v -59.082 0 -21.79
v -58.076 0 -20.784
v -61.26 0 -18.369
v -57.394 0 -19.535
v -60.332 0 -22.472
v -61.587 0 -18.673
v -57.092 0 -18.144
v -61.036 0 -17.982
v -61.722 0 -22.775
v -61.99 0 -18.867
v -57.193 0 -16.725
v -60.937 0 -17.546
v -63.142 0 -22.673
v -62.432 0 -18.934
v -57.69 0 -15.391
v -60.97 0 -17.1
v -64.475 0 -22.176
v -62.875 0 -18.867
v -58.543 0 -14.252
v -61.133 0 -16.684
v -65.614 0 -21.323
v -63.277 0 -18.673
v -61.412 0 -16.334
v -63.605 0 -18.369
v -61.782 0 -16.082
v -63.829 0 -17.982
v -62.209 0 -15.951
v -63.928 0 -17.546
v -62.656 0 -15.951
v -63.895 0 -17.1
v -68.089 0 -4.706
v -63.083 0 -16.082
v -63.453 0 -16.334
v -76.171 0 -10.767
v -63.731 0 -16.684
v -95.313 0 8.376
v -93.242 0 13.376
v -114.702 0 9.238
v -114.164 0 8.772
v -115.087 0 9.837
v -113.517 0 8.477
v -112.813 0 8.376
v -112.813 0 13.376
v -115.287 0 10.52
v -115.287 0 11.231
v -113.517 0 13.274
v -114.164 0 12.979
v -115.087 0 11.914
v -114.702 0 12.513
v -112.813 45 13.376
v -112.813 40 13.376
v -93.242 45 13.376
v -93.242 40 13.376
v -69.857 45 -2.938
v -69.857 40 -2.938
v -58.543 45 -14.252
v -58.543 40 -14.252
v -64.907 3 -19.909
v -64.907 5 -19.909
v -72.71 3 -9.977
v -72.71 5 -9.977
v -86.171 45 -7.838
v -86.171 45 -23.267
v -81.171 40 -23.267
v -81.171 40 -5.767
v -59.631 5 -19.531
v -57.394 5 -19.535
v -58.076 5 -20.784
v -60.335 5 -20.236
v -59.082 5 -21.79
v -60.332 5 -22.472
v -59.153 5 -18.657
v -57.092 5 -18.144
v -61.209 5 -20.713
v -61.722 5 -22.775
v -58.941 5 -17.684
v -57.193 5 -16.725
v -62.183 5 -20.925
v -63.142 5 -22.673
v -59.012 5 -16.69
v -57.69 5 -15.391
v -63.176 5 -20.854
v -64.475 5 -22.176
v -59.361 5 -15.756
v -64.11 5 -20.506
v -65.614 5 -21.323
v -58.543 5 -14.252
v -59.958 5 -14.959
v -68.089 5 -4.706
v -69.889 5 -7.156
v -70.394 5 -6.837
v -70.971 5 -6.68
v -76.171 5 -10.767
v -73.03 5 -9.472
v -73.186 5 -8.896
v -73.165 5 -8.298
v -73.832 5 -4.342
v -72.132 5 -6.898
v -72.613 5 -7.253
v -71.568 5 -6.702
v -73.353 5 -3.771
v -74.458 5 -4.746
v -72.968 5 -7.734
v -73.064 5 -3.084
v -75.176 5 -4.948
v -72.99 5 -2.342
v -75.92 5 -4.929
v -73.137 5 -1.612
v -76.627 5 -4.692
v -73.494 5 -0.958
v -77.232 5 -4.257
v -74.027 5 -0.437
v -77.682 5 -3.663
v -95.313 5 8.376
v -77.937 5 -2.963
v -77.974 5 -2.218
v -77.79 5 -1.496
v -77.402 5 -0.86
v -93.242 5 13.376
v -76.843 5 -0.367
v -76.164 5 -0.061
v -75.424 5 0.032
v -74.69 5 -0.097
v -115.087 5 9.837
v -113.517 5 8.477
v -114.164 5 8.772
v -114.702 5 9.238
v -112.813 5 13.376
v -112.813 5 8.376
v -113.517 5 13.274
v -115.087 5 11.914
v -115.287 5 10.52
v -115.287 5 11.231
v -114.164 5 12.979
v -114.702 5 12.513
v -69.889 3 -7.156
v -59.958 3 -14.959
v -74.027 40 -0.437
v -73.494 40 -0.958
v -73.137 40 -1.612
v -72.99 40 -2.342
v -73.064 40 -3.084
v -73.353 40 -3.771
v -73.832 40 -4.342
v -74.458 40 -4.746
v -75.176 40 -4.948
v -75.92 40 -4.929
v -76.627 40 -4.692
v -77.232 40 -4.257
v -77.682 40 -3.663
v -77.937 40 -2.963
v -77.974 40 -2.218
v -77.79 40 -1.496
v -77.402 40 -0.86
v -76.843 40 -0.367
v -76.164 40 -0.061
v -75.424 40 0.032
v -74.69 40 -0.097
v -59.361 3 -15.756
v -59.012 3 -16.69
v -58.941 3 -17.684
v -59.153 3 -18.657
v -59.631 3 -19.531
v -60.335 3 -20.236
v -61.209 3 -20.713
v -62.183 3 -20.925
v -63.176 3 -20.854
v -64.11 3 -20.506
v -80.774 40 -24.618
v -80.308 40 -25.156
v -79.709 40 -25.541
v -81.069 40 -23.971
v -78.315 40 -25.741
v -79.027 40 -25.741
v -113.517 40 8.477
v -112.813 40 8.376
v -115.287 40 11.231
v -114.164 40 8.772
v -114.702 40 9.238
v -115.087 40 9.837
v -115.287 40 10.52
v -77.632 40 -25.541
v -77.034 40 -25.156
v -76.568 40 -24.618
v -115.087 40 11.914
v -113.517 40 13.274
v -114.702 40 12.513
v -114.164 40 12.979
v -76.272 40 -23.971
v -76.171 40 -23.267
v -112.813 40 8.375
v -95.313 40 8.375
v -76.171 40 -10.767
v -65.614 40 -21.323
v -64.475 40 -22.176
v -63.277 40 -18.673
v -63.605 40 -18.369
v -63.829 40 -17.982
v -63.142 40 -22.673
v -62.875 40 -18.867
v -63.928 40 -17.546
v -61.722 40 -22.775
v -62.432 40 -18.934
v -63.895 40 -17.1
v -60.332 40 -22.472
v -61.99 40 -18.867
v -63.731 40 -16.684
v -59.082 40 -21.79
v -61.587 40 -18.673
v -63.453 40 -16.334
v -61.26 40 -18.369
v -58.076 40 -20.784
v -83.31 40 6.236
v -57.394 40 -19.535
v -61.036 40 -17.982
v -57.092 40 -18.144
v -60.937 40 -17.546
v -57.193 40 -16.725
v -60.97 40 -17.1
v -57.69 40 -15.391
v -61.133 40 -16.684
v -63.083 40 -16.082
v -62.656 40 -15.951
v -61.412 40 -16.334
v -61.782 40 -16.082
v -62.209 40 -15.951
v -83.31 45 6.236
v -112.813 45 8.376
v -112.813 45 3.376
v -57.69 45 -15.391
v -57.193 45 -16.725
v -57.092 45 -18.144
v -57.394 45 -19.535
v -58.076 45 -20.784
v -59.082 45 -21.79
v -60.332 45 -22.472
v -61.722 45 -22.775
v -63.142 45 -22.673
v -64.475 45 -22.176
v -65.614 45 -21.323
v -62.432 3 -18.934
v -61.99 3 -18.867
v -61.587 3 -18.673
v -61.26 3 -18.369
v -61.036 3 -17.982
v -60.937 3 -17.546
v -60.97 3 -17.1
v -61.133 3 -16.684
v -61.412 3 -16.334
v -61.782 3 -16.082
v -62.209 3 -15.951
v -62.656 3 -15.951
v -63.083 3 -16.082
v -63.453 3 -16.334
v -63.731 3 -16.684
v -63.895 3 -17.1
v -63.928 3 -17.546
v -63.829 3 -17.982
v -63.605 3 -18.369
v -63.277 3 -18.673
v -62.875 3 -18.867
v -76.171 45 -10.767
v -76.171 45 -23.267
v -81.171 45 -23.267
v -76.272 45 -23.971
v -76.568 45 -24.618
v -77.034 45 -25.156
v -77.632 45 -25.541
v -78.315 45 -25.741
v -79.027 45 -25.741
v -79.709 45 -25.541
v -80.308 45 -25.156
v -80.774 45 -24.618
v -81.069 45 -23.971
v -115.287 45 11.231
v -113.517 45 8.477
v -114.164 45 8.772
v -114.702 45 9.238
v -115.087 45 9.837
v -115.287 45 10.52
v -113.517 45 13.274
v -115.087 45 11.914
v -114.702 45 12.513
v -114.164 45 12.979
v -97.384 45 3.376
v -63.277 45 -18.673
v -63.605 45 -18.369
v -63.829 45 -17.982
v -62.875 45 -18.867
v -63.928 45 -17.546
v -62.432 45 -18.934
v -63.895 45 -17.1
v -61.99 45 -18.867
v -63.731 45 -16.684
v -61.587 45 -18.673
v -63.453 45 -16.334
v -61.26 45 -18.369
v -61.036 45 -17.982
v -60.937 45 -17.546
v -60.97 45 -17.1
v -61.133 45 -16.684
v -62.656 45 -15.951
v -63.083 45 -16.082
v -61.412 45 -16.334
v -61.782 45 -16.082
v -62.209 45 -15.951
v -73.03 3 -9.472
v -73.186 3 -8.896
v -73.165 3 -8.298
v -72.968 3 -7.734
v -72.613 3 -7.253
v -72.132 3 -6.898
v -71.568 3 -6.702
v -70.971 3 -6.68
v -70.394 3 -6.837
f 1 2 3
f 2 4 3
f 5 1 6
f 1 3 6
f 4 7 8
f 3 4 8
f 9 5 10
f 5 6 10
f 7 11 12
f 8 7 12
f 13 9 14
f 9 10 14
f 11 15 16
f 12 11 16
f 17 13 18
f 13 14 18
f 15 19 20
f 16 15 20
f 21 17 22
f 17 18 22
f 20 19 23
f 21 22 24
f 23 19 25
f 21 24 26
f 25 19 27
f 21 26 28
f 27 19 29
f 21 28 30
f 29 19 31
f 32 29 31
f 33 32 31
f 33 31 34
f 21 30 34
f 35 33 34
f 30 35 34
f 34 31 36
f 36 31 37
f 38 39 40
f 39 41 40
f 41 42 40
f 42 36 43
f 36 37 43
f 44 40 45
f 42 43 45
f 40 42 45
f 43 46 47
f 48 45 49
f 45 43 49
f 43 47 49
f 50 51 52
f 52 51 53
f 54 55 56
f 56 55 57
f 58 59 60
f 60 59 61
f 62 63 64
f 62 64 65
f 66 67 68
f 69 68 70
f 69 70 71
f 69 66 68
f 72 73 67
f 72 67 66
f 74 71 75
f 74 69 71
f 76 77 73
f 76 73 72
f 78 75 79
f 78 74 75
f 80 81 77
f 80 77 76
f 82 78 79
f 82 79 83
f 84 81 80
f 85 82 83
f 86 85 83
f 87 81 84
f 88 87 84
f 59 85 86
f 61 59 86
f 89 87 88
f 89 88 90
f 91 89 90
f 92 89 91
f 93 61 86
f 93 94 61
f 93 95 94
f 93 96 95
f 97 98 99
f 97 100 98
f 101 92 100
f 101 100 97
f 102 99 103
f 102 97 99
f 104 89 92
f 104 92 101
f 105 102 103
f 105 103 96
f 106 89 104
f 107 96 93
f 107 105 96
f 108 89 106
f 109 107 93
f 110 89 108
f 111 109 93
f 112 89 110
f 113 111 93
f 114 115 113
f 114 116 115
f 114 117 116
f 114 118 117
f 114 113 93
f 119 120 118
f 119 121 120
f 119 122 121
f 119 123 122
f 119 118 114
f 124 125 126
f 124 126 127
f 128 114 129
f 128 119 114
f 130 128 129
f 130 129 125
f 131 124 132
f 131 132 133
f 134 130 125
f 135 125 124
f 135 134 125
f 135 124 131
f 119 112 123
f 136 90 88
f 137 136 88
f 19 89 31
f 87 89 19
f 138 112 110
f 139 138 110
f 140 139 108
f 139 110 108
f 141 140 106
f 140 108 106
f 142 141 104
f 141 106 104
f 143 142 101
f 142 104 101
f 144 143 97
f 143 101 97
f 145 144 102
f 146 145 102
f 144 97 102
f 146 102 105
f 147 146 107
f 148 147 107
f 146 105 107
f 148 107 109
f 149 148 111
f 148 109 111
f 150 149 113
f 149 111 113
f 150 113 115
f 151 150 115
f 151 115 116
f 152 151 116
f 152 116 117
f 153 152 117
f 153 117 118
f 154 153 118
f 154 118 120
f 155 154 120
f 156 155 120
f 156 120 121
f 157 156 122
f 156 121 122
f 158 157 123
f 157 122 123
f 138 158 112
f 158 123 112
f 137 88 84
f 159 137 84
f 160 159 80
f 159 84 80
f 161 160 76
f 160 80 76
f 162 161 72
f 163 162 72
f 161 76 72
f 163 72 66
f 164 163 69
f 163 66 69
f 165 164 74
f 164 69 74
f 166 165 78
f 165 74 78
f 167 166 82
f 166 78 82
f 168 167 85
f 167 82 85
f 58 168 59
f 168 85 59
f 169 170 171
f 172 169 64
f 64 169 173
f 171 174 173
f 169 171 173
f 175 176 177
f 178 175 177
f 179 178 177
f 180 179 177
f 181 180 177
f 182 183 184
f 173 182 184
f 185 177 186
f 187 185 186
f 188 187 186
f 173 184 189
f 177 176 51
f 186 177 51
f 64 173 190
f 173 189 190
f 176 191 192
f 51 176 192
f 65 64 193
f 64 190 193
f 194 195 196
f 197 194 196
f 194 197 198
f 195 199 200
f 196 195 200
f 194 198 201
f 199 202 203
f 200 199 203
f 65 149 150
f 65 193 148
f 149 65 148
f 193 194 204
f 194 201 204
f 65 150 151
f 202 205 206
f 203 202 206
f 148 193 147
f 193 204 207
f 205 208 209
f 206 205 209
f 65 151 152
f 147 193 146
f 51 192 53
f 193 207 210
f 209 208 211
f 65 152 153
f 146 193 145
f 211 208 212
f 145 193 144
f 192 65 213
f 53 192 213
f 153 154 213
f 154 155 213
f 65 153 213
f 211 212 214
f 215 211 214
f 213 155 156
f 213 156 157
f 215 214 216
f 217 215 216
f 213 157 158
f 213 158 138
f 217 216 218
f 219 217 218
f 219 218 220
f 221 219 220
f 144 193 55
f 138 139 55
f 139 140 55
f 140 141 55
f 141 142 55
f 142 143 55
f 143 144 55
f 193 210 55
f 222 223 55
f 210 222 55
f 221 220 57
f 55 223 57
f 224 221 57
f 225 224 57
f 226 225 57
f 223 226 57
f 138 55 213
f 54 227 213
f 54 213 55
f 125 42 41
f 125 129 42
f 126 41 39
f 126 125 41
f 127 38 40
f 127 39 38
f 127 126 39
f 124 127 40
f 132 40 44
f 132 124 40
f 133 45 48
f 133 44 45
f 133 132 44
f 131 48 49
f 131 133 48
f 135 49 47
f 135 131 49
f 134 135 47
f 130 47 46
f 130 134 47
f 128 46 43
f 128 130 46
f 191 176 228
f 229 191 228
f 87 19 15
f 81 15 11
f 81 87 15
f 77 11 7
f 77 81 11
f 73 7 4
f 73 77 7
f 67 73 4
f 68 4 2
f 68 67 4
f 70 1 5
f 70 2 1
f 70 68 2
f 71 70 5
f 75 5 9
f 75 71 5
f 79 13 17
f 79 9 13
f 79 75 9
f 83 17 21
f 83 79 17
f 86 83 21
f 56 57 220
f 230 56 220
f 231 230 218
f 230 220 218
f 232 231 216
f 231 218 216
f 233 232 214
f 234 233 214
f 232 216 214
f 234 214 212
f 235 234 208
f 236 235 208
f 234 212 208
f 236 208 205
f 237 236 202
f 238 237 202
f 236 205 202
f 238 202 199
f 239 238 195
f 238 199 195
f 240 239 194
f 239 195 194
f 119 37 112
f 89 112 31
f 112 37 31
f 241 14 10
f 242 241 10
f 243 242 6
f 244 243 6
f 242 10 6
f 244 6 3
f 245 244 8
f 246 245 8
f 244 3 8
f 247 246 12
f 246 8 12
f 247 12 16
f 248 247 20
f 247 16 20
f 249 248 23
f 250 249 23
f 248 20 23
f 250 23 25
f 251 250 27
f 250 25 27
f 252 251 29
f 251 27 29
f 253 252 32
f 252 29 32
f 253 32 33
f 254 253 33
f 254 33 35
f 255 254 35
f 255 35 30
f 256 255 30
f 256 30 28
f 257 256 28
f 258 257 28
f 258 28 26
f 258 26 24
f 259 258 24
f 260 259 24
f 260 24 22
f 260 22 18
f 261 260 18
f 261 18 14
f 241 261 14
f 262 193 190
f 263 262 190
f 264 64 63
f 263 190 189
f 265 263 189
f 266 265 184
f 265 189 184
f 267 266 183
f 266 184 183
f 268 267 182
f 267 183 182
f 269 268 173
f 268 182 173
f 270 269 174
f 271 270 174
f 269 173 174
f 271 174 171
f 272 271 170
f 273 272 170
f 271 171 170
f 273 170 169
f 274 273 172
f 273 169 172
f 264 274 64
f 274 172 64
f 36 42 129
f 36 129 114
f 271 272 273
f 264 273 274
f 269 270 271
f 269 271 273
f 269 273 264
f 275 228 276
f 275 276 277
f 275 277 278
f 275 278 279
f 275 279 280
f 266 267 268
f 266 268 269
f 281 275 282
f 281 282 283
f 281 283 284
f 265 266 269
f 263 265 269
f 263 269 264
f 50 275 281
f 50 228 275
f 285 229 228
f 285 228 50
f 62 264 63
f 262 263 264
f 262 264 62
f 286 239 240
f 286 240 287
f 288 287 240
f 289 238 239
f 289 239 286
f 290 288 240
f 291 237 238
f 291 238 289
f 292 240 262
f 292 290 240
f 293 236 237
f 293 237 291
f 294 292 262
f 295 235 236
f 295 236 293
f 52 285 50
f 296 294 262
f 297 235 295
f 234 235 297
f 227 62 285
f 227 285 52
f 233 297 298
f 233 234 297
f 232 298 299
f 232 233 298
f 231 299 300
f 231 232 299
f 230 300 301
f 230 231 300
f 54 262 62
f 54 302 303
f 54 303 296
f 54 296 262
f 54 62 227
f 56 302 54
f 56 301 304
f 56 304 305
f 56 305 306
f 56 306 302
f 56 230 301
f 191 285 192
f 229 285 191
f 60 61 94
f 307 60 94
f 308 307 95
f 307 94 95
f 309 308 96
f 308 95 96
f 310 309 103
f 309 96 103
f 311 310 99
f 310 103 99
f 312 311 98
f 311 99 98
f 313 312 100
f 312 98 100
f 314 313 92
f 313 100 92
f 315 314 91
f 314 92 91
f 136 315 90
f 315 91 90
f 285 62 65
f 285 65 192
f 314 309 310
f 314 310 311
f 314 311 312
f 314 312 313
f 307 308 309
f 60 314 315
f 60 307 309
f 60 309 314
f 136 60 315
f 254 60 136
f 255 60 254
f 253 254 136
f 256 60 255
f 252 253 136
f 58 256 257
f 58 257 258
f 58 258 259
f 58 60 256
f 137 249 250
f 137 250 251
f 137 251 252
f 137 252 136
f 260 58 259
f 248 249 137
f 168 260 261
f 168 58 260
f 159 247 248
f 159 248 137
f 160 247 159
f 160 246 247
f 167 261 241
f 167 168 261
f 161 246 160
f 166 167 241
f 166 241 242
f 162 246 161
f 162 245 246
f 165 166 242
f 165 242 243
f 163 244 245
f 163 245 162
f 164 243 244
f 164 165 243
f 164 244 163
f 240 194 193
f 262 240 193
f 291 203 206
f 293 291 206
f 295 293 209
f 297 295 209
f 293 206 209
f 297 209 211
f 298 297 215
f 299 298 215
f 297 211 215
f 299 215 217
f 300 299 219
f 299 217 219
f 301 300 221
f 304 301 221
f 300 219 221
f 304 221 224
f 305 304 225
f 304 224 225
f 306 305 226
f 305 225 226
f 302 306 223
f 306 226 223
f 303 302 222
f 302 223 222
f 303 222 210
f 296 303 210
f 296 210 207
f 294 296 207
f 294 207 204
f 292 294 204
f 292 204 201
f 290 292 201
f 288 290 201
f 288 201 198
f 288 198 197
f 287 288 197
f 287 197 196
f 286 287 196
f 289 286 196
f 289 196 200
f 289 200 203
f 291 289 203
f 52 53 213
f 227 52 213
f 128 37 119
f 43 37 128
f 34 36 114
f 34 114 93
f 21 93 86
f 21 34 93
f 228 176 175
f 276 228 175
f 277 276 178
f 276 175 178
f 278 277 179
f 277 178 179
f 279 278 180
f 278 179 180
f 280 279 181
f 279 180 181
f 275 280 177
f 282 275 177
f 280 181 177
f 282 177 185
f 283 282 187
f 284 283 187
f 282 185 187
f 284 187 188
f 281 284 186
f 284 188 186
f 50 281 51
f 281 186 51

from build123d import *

# Parameters (mm, degrees)
AUFSATZ_LINEAR_AUSTRAGEN1_DEPTH  = 5
VERRUNDUNG1_RADIUS               = 2.5
VERRUNDUNG1_LENGTH               = 5
SKIZZE6_W                        = 37
SKIZZE6_H                        = 5
AUFSATZ_LINEAR_AUSTRAGEN3_DEPTH  = 5
SCHNITT_LINEAR_AUSTRAGEN3_DEPTH  = 5
AUFSATZ_LINEAR_AUSTRAGEN6_DEPTH  = 5
SCHNITT_LINEAR_AUSTRAGEN2_DEPTH  = 2
VERRUNDUNG8_RADIUS               = 2.5
VERRUNDUNG8_LENGTH               = 5
VERRUNDUNG9_RADIUS               = 5
VERRUNDUNG9_LENGTH               = 5
SKIZZE37_R                       = 2.5
AUFSATZ_LINEAR_AUSTRAGEN11_DEPTH = 35
SPIEGELN19_START                 = 40
SPIEGELN19_DEPTH                 = 5
SCHNITT_LINEAR_AUSTRAGEN4_DEPTH  = 5
SKIZZE39_W                       = 20
SKIZZE39_H                       = 5
AUFSATZ_LINEAR_AUSTRAGEN12_DEPTH = 5
SKIZZE40_W                       = 17.5
SKIZZE40_H                       = 5
AUFSATZ_LINEAR_AUSTRAGEN14_DEPTH = 5
SKIZZE41_W                       = 17.5
SKIZZE41_H                       = 5
AUFSATZ_LINEAR_AUSTRAGEN15_DEPTH = 5
FASE10_SIZE                      = 5
SKIZZE42_R                       = 1.5
SCHNITT_LINEAR_AUSTRAGEN6_DEPTH  = 127.435665063
SCHNITT_LINEAR_AUSTRAGEN7_DEPTH  = 5


# Read off the part's stored shape, not the designer's step: Spiegeln19
with BuildPart() as part:
    # Skizze2 → Aufsatz-Linear austragen1 (new body)
    with BuildSketch(Plane(origin=(0, 0, 0), x_dir=(1, 0, 0), z_dir=(0, 1, 0))):
        Polygon((-81.170751107, 25.766558824), (-76.170751107, 25.766558824), (-76.170751107, 3.695491012), (-93.241818919, -13.3755768), (-115.312886731, -13.3755768), (-115.312886731, -8.3755768), (-95.312886731, -8.3755768), (-81.170751107, 5.766558824), align=None)
    extrude(amount=AUFSATZ_LINEAR_AUSTRAGEN1_DEPTH)

    # Verrundung1: full round fillet: the end face becomes a half cylinder, R = half its width
    verrundung1_face = Plane((-115.312886731, 2.5, 10.8755768), x_dir=(0, 1, 0), z_dir=(-1, 0, 0))  # on the end face: x along it, z out of the body
    verrundung1_slab = verrundung1_face.offset(-VERRUNDUNG1_RADIUS / 2) * Box(VERRUNDUNG1_LENGTH, 2 * VERRUNDUNG1_RADIUS, VERRUNDUNG1_RADIUS, mode=Mode.PRIVATE)  # the body's end, R deep
    verrundung1_round = Plane((-112.812886731, 2.5, 10.8755768), x_dir=(-1, 0, 0), z_dir=(0, 1, 0)) * Cylinder(VERRUNDUNG1_RADIUS, VERRUNDUNG1_LENGTH, mode=Mode.PRIVATE)  # its axis R under the face
    add(verrundung1_slab - verrundung1_round, mode=Mode.SUBTRACT)

    # Skizze6 → Aufsatz-Linear austragen3 (add, symmetric)
    with BuildSketch(Plane(origin=(-39.933121059, 0, -39.933121059), x_dir=(0.7071067811865485, 0, -0.7071067811865467), z_dir=(0.7071067811865467, 0, 0.7071067811865485))):
        with Locations((-44.818815693, 2.5)):
            Rectangle(SKIZZE6_W, SKIZZE6_H)
    extrude(amount=AUFSATZ_LINEAR_AUSTRAGEN3_DEPTH, both=True)

    # Skizze10 → Schnitt-Linear austragen3 (cut)
    with BuildSketch(Plane.XZ):
        Polygon((-84.706285013, 4.840042894), (-68.089275655, -4.705898652), (-81.170751107, 8.3755768), align=None)
    extrude(amount=-SCHNITT_LINEAR_AUSTRAGEN3_DEPTH, mode=Mode.SUBTRACT)

    # Skizze15 → Aufsatz-Linear austragen6 (add)
    with BuildSketch(Plane.XZ):
        Polygon((-93.241818919, 13.3755768), (-68.089275655, -4.705898652), (-84.706285013, 4.840042894), align=None)
    extrude(amount=-AUFSATZ_LINEAR_AUSTRAGEN6_DEPTH)

    # Skizze9 → Schnitt-Linear austragen2 (cut)
    with BuildSketch(Plane(origin=(0, 5, 0), x_dir=(1, 0, 0), z_dir=(0, 1, 0))):
        with BuildLine():
            Line((-64.90729514, 19.908694448), (-72.710166677, 9.977325168))
            ThreePointArc((-72.710166677, 9.977325168), (-72.613070241, 7.253171877), (-69.888916951, 7.156075442))
            Line((-69.888916951, 7.156075442), (-59.957547671, 14.958946979))
            ThreePointArc((-59.957547671, 14.958946979), (-59.957547671, 19.908694448), (-64.90729514, 19.908694448))
        make_face()
    extrude(amount=-SCHNITT_LINEAR_AUSTRAGEN2_DEPTH, mode=Mode.SUBTRACT)

    # Verrundung8: full round fillet: the end face becomes a half cylinder, R = half its width
    verrundung8_face = Plane((-78.670751107, 2.5, -25.766558824), x_dir=(0, 1, 0), z_dir=(0, 0, -1))  # on the end face: x along it, z out of the body
    verrundung8_slab = verrundung8_face.offset(-VERRUNDUNG8_RADIUS / 2) * Box(VERRUNDUNG8_LENGTH, 2 * VERRUNDUNG8_RADIUS, VERRUNDUNG8_RADIUS, mode=Mode.PRIVATE)  # the body's end, R deep
    verrundung8_round = Plane((-78.670751107, 2.5, -23.266558824), x_dir=(0, 0, -1), z_dir=(0, 1, 0)) * Cylinder(VERRUNDUNG8_RADIUS, VERRUNDUNG8_LENGTH, mode=Mode.PRIVATE)  # its axis R under the face
    add(verrundung8_slab - verrundung8_round, mode=Mode.SUBTRACT)

    # Verrundung9: full round fillet: the end face becomes a half cylinder, R = half its width
    verrundung9_face = Plane((-58.543334109, 2.5, -21.32290801), x_dir=(0, 1, 0), z_dir=(0.707106781187, 0, -0.707106781187))  # on the end face: x along it, z out of the body
    verrundung9_slab = verrundung9_face.offset(-VERRUNDUNG9_RADIUS / 2) * Box(VERRUNDUNG9_LENGTH, 2 * VERRUNDUNG9_RADIUS, VERRUNDUNG9_RADIUS, mode=Mode.PRIVATE)  # the body's end, R deep
    verrundung9_round = Plane((-62.078868015, 2.5, -17.787374104), x_dir=(0.707106781187, 0, -0.707106781187), z_dir=(0, 1, 0)) * Cylinder(VERRUNDUNG9_RADIUS, VERRUNDUNG9_LENGTH, mode=Mode.PRIVATE)  # its axis R under the face
    add(verrundung9_slab - verrundung9_round, mode=Mode.SUBTRACT)

    # Skizze37 → Aufsatz-Linear austragen11 (add)
    with BuildSketch(Plane(origin=(0, 5, 0), x_dir=(1, 0, 0), z_dir=(0, 1, 0))):
        with Locations(Location((-75.486500657, 2.467174327, 0), (0, 0, 305.711324765))):
            Circle(SKIZZE37_R)
    extrude(amount=AUFSATZ_LINEAR_AUSTRAGEN11_DEPTH)

    # Spiegeln19 outline → Spiegeln19 (add)
    with BuildSketch(Plane(origin=(0, 0, 0), x_dir=(1, 0, 0), z_dir=(0, 1, 0)).offset(SPIEGELN19_START)):
        with BuildLine():
            ThreePointArc((-58.543334109, 14.251840198), (-58.543334109, 21.32290801), (-65.614401921, 21.32290801))
            Line((-65.614401921, 21.32290801), (-76.170751107, 10.766558824))
            Line((-76.170751107, 10.766558824), (-76.170751107, 23.266558824))
            ThreePointArc((-76.170751107, 23.266558824), (-78.670751107, 25.766558824), (-81.170751107, 23.266558824))
            Line((-81.170751107, 23.266558824), (-81.170751107, 5.766558824))
            Line((-81.170751107, 5.766558824), (-95.312886731, -8.3755768))
            Line((-95.312886731, -8.3755768), (-112.812886731, -8.3755768))
            ThreePointArc((-112.812886731, -8.3755768), (-115.312886731, -10.8755768), (-112.812886731, -13.3755768))
            Line((-112.812886731, -13.3755768), (-93.241818919, -13.3755768))
            Line((-93.241818919, -13.3755768), (-83.310270003, -6.236057904))
            Line((-83.310270003, -6.236057904), (-81.170751107, -8.3755768))
            Line((-81.170751107, -8.3755768), (-58.543334109, 14.251840198))
        make_face()
    extrude(amount=SPIEGELN19_DEPTH)

    # Skizze38 → Schnitt-Linear austragen4 (cut)
    with BuildSketch(Plane(origin=(0, 45, 0), x_dir=(1, 0, 0), z_dir=(0, 1, 0))):
        Polygon((-83.310270003, -6.236057904), (-69.857042608, 2.938131699), (-81.170751107, -8.3755768), align=None)
    extrude(amount=-SCHNITT_LINEAR_AUSTRAGEN4_DEPTH, mode=Mode.SUBTRACT)

    # Skizze39 → Aufsatz-Linear austragen12 (add)
    with BuildSketch(Plane(origin=(-43.468654965, 0, -43.468654965), x_dir=(-0.7071067811865486, 0, 0.7071067811865465), z_dir=(-0.7071067811865465, 0, -0.7071067811865486))):
        with Locations((63.318815693, 42.5)):
            Rectangle(SKIZZE39_W, SKIZZE39_H)
    extrude(amount=AUFSATZ_LINEAR_AUSTRAGEN12_DEPTH)

    # Skizze40 → Aufsatz-Linear austragen14 (add)
    with BuildSketch(Plane.ZY.offset(81.170751107)):
        with Locations((-14.516558824, 42.5)):
            Rectangle(SKIZZE40_W, SKIZZE40_H)
    extrude(amount=AUFSATZ_LINEAR_AUSTRAGEN14_DEPTH)

    # Skizze41 → Aufsatz-Linear austragen15 (add)
    with BuildSketch(Plane(origin=(0, 0, 8.3755768), x_dir=(-1, 0, 0), z_dir=(0, 0, -1))):
        with Locations((104.062886731, 42.5)):
            Rectangle(SKIZZE41_W, SKIZZE41_H)
    extrude(amount=AUFSATZ_LINEAR_AUSTRAGEN15_DEPTH)

    # Fase10
    fase10_edges = [part.edges().sort_by_distance(p)[0] for p in [
        (-86.170751107, 40, -15.55209273),
        (-91.777352825, 40, -2.231024918),
        (-105.098420637, 40, 3.3755768),
    ]]
    chamfer(fase10_edges, length=FASE10_SIZE - 0.0001)  # a hair under: the kernel refuses the full size

    # Skizze42 → Schnitt-Linear austragen6 (cut, through all)
    with BuildSketch(Plane.XZ):
        with Locations(Location((-62.432421405, -17.433820713, 0), (0, 0, 270))):
            Circle(SKIZZE42_R)
    extrude(amount=-SCHNITT_LINEAR_AUSTRAGEN6_DEPTH, mode=Mode.SUBTRACT)

    # Skizze43 → Schnitt-Linear austragen7 (cut)
    with BuildSketch(Plane(origin=(0, 0, 0), x_dir=(-1, 0, 0), z_dir=(0, -1, 0))):
        Polygon((81.170751107, 5.766558824), (76.170751107, 10.766558824), (76.170751107, 25.766558824), (81.170751107, 25.766558824), align=None)
    extrude(amount=-SCHNITT_LINEAR_AUSTRAGEN7_DEPTH, mode=Mode.SUBTRACT)


solid = part.part
